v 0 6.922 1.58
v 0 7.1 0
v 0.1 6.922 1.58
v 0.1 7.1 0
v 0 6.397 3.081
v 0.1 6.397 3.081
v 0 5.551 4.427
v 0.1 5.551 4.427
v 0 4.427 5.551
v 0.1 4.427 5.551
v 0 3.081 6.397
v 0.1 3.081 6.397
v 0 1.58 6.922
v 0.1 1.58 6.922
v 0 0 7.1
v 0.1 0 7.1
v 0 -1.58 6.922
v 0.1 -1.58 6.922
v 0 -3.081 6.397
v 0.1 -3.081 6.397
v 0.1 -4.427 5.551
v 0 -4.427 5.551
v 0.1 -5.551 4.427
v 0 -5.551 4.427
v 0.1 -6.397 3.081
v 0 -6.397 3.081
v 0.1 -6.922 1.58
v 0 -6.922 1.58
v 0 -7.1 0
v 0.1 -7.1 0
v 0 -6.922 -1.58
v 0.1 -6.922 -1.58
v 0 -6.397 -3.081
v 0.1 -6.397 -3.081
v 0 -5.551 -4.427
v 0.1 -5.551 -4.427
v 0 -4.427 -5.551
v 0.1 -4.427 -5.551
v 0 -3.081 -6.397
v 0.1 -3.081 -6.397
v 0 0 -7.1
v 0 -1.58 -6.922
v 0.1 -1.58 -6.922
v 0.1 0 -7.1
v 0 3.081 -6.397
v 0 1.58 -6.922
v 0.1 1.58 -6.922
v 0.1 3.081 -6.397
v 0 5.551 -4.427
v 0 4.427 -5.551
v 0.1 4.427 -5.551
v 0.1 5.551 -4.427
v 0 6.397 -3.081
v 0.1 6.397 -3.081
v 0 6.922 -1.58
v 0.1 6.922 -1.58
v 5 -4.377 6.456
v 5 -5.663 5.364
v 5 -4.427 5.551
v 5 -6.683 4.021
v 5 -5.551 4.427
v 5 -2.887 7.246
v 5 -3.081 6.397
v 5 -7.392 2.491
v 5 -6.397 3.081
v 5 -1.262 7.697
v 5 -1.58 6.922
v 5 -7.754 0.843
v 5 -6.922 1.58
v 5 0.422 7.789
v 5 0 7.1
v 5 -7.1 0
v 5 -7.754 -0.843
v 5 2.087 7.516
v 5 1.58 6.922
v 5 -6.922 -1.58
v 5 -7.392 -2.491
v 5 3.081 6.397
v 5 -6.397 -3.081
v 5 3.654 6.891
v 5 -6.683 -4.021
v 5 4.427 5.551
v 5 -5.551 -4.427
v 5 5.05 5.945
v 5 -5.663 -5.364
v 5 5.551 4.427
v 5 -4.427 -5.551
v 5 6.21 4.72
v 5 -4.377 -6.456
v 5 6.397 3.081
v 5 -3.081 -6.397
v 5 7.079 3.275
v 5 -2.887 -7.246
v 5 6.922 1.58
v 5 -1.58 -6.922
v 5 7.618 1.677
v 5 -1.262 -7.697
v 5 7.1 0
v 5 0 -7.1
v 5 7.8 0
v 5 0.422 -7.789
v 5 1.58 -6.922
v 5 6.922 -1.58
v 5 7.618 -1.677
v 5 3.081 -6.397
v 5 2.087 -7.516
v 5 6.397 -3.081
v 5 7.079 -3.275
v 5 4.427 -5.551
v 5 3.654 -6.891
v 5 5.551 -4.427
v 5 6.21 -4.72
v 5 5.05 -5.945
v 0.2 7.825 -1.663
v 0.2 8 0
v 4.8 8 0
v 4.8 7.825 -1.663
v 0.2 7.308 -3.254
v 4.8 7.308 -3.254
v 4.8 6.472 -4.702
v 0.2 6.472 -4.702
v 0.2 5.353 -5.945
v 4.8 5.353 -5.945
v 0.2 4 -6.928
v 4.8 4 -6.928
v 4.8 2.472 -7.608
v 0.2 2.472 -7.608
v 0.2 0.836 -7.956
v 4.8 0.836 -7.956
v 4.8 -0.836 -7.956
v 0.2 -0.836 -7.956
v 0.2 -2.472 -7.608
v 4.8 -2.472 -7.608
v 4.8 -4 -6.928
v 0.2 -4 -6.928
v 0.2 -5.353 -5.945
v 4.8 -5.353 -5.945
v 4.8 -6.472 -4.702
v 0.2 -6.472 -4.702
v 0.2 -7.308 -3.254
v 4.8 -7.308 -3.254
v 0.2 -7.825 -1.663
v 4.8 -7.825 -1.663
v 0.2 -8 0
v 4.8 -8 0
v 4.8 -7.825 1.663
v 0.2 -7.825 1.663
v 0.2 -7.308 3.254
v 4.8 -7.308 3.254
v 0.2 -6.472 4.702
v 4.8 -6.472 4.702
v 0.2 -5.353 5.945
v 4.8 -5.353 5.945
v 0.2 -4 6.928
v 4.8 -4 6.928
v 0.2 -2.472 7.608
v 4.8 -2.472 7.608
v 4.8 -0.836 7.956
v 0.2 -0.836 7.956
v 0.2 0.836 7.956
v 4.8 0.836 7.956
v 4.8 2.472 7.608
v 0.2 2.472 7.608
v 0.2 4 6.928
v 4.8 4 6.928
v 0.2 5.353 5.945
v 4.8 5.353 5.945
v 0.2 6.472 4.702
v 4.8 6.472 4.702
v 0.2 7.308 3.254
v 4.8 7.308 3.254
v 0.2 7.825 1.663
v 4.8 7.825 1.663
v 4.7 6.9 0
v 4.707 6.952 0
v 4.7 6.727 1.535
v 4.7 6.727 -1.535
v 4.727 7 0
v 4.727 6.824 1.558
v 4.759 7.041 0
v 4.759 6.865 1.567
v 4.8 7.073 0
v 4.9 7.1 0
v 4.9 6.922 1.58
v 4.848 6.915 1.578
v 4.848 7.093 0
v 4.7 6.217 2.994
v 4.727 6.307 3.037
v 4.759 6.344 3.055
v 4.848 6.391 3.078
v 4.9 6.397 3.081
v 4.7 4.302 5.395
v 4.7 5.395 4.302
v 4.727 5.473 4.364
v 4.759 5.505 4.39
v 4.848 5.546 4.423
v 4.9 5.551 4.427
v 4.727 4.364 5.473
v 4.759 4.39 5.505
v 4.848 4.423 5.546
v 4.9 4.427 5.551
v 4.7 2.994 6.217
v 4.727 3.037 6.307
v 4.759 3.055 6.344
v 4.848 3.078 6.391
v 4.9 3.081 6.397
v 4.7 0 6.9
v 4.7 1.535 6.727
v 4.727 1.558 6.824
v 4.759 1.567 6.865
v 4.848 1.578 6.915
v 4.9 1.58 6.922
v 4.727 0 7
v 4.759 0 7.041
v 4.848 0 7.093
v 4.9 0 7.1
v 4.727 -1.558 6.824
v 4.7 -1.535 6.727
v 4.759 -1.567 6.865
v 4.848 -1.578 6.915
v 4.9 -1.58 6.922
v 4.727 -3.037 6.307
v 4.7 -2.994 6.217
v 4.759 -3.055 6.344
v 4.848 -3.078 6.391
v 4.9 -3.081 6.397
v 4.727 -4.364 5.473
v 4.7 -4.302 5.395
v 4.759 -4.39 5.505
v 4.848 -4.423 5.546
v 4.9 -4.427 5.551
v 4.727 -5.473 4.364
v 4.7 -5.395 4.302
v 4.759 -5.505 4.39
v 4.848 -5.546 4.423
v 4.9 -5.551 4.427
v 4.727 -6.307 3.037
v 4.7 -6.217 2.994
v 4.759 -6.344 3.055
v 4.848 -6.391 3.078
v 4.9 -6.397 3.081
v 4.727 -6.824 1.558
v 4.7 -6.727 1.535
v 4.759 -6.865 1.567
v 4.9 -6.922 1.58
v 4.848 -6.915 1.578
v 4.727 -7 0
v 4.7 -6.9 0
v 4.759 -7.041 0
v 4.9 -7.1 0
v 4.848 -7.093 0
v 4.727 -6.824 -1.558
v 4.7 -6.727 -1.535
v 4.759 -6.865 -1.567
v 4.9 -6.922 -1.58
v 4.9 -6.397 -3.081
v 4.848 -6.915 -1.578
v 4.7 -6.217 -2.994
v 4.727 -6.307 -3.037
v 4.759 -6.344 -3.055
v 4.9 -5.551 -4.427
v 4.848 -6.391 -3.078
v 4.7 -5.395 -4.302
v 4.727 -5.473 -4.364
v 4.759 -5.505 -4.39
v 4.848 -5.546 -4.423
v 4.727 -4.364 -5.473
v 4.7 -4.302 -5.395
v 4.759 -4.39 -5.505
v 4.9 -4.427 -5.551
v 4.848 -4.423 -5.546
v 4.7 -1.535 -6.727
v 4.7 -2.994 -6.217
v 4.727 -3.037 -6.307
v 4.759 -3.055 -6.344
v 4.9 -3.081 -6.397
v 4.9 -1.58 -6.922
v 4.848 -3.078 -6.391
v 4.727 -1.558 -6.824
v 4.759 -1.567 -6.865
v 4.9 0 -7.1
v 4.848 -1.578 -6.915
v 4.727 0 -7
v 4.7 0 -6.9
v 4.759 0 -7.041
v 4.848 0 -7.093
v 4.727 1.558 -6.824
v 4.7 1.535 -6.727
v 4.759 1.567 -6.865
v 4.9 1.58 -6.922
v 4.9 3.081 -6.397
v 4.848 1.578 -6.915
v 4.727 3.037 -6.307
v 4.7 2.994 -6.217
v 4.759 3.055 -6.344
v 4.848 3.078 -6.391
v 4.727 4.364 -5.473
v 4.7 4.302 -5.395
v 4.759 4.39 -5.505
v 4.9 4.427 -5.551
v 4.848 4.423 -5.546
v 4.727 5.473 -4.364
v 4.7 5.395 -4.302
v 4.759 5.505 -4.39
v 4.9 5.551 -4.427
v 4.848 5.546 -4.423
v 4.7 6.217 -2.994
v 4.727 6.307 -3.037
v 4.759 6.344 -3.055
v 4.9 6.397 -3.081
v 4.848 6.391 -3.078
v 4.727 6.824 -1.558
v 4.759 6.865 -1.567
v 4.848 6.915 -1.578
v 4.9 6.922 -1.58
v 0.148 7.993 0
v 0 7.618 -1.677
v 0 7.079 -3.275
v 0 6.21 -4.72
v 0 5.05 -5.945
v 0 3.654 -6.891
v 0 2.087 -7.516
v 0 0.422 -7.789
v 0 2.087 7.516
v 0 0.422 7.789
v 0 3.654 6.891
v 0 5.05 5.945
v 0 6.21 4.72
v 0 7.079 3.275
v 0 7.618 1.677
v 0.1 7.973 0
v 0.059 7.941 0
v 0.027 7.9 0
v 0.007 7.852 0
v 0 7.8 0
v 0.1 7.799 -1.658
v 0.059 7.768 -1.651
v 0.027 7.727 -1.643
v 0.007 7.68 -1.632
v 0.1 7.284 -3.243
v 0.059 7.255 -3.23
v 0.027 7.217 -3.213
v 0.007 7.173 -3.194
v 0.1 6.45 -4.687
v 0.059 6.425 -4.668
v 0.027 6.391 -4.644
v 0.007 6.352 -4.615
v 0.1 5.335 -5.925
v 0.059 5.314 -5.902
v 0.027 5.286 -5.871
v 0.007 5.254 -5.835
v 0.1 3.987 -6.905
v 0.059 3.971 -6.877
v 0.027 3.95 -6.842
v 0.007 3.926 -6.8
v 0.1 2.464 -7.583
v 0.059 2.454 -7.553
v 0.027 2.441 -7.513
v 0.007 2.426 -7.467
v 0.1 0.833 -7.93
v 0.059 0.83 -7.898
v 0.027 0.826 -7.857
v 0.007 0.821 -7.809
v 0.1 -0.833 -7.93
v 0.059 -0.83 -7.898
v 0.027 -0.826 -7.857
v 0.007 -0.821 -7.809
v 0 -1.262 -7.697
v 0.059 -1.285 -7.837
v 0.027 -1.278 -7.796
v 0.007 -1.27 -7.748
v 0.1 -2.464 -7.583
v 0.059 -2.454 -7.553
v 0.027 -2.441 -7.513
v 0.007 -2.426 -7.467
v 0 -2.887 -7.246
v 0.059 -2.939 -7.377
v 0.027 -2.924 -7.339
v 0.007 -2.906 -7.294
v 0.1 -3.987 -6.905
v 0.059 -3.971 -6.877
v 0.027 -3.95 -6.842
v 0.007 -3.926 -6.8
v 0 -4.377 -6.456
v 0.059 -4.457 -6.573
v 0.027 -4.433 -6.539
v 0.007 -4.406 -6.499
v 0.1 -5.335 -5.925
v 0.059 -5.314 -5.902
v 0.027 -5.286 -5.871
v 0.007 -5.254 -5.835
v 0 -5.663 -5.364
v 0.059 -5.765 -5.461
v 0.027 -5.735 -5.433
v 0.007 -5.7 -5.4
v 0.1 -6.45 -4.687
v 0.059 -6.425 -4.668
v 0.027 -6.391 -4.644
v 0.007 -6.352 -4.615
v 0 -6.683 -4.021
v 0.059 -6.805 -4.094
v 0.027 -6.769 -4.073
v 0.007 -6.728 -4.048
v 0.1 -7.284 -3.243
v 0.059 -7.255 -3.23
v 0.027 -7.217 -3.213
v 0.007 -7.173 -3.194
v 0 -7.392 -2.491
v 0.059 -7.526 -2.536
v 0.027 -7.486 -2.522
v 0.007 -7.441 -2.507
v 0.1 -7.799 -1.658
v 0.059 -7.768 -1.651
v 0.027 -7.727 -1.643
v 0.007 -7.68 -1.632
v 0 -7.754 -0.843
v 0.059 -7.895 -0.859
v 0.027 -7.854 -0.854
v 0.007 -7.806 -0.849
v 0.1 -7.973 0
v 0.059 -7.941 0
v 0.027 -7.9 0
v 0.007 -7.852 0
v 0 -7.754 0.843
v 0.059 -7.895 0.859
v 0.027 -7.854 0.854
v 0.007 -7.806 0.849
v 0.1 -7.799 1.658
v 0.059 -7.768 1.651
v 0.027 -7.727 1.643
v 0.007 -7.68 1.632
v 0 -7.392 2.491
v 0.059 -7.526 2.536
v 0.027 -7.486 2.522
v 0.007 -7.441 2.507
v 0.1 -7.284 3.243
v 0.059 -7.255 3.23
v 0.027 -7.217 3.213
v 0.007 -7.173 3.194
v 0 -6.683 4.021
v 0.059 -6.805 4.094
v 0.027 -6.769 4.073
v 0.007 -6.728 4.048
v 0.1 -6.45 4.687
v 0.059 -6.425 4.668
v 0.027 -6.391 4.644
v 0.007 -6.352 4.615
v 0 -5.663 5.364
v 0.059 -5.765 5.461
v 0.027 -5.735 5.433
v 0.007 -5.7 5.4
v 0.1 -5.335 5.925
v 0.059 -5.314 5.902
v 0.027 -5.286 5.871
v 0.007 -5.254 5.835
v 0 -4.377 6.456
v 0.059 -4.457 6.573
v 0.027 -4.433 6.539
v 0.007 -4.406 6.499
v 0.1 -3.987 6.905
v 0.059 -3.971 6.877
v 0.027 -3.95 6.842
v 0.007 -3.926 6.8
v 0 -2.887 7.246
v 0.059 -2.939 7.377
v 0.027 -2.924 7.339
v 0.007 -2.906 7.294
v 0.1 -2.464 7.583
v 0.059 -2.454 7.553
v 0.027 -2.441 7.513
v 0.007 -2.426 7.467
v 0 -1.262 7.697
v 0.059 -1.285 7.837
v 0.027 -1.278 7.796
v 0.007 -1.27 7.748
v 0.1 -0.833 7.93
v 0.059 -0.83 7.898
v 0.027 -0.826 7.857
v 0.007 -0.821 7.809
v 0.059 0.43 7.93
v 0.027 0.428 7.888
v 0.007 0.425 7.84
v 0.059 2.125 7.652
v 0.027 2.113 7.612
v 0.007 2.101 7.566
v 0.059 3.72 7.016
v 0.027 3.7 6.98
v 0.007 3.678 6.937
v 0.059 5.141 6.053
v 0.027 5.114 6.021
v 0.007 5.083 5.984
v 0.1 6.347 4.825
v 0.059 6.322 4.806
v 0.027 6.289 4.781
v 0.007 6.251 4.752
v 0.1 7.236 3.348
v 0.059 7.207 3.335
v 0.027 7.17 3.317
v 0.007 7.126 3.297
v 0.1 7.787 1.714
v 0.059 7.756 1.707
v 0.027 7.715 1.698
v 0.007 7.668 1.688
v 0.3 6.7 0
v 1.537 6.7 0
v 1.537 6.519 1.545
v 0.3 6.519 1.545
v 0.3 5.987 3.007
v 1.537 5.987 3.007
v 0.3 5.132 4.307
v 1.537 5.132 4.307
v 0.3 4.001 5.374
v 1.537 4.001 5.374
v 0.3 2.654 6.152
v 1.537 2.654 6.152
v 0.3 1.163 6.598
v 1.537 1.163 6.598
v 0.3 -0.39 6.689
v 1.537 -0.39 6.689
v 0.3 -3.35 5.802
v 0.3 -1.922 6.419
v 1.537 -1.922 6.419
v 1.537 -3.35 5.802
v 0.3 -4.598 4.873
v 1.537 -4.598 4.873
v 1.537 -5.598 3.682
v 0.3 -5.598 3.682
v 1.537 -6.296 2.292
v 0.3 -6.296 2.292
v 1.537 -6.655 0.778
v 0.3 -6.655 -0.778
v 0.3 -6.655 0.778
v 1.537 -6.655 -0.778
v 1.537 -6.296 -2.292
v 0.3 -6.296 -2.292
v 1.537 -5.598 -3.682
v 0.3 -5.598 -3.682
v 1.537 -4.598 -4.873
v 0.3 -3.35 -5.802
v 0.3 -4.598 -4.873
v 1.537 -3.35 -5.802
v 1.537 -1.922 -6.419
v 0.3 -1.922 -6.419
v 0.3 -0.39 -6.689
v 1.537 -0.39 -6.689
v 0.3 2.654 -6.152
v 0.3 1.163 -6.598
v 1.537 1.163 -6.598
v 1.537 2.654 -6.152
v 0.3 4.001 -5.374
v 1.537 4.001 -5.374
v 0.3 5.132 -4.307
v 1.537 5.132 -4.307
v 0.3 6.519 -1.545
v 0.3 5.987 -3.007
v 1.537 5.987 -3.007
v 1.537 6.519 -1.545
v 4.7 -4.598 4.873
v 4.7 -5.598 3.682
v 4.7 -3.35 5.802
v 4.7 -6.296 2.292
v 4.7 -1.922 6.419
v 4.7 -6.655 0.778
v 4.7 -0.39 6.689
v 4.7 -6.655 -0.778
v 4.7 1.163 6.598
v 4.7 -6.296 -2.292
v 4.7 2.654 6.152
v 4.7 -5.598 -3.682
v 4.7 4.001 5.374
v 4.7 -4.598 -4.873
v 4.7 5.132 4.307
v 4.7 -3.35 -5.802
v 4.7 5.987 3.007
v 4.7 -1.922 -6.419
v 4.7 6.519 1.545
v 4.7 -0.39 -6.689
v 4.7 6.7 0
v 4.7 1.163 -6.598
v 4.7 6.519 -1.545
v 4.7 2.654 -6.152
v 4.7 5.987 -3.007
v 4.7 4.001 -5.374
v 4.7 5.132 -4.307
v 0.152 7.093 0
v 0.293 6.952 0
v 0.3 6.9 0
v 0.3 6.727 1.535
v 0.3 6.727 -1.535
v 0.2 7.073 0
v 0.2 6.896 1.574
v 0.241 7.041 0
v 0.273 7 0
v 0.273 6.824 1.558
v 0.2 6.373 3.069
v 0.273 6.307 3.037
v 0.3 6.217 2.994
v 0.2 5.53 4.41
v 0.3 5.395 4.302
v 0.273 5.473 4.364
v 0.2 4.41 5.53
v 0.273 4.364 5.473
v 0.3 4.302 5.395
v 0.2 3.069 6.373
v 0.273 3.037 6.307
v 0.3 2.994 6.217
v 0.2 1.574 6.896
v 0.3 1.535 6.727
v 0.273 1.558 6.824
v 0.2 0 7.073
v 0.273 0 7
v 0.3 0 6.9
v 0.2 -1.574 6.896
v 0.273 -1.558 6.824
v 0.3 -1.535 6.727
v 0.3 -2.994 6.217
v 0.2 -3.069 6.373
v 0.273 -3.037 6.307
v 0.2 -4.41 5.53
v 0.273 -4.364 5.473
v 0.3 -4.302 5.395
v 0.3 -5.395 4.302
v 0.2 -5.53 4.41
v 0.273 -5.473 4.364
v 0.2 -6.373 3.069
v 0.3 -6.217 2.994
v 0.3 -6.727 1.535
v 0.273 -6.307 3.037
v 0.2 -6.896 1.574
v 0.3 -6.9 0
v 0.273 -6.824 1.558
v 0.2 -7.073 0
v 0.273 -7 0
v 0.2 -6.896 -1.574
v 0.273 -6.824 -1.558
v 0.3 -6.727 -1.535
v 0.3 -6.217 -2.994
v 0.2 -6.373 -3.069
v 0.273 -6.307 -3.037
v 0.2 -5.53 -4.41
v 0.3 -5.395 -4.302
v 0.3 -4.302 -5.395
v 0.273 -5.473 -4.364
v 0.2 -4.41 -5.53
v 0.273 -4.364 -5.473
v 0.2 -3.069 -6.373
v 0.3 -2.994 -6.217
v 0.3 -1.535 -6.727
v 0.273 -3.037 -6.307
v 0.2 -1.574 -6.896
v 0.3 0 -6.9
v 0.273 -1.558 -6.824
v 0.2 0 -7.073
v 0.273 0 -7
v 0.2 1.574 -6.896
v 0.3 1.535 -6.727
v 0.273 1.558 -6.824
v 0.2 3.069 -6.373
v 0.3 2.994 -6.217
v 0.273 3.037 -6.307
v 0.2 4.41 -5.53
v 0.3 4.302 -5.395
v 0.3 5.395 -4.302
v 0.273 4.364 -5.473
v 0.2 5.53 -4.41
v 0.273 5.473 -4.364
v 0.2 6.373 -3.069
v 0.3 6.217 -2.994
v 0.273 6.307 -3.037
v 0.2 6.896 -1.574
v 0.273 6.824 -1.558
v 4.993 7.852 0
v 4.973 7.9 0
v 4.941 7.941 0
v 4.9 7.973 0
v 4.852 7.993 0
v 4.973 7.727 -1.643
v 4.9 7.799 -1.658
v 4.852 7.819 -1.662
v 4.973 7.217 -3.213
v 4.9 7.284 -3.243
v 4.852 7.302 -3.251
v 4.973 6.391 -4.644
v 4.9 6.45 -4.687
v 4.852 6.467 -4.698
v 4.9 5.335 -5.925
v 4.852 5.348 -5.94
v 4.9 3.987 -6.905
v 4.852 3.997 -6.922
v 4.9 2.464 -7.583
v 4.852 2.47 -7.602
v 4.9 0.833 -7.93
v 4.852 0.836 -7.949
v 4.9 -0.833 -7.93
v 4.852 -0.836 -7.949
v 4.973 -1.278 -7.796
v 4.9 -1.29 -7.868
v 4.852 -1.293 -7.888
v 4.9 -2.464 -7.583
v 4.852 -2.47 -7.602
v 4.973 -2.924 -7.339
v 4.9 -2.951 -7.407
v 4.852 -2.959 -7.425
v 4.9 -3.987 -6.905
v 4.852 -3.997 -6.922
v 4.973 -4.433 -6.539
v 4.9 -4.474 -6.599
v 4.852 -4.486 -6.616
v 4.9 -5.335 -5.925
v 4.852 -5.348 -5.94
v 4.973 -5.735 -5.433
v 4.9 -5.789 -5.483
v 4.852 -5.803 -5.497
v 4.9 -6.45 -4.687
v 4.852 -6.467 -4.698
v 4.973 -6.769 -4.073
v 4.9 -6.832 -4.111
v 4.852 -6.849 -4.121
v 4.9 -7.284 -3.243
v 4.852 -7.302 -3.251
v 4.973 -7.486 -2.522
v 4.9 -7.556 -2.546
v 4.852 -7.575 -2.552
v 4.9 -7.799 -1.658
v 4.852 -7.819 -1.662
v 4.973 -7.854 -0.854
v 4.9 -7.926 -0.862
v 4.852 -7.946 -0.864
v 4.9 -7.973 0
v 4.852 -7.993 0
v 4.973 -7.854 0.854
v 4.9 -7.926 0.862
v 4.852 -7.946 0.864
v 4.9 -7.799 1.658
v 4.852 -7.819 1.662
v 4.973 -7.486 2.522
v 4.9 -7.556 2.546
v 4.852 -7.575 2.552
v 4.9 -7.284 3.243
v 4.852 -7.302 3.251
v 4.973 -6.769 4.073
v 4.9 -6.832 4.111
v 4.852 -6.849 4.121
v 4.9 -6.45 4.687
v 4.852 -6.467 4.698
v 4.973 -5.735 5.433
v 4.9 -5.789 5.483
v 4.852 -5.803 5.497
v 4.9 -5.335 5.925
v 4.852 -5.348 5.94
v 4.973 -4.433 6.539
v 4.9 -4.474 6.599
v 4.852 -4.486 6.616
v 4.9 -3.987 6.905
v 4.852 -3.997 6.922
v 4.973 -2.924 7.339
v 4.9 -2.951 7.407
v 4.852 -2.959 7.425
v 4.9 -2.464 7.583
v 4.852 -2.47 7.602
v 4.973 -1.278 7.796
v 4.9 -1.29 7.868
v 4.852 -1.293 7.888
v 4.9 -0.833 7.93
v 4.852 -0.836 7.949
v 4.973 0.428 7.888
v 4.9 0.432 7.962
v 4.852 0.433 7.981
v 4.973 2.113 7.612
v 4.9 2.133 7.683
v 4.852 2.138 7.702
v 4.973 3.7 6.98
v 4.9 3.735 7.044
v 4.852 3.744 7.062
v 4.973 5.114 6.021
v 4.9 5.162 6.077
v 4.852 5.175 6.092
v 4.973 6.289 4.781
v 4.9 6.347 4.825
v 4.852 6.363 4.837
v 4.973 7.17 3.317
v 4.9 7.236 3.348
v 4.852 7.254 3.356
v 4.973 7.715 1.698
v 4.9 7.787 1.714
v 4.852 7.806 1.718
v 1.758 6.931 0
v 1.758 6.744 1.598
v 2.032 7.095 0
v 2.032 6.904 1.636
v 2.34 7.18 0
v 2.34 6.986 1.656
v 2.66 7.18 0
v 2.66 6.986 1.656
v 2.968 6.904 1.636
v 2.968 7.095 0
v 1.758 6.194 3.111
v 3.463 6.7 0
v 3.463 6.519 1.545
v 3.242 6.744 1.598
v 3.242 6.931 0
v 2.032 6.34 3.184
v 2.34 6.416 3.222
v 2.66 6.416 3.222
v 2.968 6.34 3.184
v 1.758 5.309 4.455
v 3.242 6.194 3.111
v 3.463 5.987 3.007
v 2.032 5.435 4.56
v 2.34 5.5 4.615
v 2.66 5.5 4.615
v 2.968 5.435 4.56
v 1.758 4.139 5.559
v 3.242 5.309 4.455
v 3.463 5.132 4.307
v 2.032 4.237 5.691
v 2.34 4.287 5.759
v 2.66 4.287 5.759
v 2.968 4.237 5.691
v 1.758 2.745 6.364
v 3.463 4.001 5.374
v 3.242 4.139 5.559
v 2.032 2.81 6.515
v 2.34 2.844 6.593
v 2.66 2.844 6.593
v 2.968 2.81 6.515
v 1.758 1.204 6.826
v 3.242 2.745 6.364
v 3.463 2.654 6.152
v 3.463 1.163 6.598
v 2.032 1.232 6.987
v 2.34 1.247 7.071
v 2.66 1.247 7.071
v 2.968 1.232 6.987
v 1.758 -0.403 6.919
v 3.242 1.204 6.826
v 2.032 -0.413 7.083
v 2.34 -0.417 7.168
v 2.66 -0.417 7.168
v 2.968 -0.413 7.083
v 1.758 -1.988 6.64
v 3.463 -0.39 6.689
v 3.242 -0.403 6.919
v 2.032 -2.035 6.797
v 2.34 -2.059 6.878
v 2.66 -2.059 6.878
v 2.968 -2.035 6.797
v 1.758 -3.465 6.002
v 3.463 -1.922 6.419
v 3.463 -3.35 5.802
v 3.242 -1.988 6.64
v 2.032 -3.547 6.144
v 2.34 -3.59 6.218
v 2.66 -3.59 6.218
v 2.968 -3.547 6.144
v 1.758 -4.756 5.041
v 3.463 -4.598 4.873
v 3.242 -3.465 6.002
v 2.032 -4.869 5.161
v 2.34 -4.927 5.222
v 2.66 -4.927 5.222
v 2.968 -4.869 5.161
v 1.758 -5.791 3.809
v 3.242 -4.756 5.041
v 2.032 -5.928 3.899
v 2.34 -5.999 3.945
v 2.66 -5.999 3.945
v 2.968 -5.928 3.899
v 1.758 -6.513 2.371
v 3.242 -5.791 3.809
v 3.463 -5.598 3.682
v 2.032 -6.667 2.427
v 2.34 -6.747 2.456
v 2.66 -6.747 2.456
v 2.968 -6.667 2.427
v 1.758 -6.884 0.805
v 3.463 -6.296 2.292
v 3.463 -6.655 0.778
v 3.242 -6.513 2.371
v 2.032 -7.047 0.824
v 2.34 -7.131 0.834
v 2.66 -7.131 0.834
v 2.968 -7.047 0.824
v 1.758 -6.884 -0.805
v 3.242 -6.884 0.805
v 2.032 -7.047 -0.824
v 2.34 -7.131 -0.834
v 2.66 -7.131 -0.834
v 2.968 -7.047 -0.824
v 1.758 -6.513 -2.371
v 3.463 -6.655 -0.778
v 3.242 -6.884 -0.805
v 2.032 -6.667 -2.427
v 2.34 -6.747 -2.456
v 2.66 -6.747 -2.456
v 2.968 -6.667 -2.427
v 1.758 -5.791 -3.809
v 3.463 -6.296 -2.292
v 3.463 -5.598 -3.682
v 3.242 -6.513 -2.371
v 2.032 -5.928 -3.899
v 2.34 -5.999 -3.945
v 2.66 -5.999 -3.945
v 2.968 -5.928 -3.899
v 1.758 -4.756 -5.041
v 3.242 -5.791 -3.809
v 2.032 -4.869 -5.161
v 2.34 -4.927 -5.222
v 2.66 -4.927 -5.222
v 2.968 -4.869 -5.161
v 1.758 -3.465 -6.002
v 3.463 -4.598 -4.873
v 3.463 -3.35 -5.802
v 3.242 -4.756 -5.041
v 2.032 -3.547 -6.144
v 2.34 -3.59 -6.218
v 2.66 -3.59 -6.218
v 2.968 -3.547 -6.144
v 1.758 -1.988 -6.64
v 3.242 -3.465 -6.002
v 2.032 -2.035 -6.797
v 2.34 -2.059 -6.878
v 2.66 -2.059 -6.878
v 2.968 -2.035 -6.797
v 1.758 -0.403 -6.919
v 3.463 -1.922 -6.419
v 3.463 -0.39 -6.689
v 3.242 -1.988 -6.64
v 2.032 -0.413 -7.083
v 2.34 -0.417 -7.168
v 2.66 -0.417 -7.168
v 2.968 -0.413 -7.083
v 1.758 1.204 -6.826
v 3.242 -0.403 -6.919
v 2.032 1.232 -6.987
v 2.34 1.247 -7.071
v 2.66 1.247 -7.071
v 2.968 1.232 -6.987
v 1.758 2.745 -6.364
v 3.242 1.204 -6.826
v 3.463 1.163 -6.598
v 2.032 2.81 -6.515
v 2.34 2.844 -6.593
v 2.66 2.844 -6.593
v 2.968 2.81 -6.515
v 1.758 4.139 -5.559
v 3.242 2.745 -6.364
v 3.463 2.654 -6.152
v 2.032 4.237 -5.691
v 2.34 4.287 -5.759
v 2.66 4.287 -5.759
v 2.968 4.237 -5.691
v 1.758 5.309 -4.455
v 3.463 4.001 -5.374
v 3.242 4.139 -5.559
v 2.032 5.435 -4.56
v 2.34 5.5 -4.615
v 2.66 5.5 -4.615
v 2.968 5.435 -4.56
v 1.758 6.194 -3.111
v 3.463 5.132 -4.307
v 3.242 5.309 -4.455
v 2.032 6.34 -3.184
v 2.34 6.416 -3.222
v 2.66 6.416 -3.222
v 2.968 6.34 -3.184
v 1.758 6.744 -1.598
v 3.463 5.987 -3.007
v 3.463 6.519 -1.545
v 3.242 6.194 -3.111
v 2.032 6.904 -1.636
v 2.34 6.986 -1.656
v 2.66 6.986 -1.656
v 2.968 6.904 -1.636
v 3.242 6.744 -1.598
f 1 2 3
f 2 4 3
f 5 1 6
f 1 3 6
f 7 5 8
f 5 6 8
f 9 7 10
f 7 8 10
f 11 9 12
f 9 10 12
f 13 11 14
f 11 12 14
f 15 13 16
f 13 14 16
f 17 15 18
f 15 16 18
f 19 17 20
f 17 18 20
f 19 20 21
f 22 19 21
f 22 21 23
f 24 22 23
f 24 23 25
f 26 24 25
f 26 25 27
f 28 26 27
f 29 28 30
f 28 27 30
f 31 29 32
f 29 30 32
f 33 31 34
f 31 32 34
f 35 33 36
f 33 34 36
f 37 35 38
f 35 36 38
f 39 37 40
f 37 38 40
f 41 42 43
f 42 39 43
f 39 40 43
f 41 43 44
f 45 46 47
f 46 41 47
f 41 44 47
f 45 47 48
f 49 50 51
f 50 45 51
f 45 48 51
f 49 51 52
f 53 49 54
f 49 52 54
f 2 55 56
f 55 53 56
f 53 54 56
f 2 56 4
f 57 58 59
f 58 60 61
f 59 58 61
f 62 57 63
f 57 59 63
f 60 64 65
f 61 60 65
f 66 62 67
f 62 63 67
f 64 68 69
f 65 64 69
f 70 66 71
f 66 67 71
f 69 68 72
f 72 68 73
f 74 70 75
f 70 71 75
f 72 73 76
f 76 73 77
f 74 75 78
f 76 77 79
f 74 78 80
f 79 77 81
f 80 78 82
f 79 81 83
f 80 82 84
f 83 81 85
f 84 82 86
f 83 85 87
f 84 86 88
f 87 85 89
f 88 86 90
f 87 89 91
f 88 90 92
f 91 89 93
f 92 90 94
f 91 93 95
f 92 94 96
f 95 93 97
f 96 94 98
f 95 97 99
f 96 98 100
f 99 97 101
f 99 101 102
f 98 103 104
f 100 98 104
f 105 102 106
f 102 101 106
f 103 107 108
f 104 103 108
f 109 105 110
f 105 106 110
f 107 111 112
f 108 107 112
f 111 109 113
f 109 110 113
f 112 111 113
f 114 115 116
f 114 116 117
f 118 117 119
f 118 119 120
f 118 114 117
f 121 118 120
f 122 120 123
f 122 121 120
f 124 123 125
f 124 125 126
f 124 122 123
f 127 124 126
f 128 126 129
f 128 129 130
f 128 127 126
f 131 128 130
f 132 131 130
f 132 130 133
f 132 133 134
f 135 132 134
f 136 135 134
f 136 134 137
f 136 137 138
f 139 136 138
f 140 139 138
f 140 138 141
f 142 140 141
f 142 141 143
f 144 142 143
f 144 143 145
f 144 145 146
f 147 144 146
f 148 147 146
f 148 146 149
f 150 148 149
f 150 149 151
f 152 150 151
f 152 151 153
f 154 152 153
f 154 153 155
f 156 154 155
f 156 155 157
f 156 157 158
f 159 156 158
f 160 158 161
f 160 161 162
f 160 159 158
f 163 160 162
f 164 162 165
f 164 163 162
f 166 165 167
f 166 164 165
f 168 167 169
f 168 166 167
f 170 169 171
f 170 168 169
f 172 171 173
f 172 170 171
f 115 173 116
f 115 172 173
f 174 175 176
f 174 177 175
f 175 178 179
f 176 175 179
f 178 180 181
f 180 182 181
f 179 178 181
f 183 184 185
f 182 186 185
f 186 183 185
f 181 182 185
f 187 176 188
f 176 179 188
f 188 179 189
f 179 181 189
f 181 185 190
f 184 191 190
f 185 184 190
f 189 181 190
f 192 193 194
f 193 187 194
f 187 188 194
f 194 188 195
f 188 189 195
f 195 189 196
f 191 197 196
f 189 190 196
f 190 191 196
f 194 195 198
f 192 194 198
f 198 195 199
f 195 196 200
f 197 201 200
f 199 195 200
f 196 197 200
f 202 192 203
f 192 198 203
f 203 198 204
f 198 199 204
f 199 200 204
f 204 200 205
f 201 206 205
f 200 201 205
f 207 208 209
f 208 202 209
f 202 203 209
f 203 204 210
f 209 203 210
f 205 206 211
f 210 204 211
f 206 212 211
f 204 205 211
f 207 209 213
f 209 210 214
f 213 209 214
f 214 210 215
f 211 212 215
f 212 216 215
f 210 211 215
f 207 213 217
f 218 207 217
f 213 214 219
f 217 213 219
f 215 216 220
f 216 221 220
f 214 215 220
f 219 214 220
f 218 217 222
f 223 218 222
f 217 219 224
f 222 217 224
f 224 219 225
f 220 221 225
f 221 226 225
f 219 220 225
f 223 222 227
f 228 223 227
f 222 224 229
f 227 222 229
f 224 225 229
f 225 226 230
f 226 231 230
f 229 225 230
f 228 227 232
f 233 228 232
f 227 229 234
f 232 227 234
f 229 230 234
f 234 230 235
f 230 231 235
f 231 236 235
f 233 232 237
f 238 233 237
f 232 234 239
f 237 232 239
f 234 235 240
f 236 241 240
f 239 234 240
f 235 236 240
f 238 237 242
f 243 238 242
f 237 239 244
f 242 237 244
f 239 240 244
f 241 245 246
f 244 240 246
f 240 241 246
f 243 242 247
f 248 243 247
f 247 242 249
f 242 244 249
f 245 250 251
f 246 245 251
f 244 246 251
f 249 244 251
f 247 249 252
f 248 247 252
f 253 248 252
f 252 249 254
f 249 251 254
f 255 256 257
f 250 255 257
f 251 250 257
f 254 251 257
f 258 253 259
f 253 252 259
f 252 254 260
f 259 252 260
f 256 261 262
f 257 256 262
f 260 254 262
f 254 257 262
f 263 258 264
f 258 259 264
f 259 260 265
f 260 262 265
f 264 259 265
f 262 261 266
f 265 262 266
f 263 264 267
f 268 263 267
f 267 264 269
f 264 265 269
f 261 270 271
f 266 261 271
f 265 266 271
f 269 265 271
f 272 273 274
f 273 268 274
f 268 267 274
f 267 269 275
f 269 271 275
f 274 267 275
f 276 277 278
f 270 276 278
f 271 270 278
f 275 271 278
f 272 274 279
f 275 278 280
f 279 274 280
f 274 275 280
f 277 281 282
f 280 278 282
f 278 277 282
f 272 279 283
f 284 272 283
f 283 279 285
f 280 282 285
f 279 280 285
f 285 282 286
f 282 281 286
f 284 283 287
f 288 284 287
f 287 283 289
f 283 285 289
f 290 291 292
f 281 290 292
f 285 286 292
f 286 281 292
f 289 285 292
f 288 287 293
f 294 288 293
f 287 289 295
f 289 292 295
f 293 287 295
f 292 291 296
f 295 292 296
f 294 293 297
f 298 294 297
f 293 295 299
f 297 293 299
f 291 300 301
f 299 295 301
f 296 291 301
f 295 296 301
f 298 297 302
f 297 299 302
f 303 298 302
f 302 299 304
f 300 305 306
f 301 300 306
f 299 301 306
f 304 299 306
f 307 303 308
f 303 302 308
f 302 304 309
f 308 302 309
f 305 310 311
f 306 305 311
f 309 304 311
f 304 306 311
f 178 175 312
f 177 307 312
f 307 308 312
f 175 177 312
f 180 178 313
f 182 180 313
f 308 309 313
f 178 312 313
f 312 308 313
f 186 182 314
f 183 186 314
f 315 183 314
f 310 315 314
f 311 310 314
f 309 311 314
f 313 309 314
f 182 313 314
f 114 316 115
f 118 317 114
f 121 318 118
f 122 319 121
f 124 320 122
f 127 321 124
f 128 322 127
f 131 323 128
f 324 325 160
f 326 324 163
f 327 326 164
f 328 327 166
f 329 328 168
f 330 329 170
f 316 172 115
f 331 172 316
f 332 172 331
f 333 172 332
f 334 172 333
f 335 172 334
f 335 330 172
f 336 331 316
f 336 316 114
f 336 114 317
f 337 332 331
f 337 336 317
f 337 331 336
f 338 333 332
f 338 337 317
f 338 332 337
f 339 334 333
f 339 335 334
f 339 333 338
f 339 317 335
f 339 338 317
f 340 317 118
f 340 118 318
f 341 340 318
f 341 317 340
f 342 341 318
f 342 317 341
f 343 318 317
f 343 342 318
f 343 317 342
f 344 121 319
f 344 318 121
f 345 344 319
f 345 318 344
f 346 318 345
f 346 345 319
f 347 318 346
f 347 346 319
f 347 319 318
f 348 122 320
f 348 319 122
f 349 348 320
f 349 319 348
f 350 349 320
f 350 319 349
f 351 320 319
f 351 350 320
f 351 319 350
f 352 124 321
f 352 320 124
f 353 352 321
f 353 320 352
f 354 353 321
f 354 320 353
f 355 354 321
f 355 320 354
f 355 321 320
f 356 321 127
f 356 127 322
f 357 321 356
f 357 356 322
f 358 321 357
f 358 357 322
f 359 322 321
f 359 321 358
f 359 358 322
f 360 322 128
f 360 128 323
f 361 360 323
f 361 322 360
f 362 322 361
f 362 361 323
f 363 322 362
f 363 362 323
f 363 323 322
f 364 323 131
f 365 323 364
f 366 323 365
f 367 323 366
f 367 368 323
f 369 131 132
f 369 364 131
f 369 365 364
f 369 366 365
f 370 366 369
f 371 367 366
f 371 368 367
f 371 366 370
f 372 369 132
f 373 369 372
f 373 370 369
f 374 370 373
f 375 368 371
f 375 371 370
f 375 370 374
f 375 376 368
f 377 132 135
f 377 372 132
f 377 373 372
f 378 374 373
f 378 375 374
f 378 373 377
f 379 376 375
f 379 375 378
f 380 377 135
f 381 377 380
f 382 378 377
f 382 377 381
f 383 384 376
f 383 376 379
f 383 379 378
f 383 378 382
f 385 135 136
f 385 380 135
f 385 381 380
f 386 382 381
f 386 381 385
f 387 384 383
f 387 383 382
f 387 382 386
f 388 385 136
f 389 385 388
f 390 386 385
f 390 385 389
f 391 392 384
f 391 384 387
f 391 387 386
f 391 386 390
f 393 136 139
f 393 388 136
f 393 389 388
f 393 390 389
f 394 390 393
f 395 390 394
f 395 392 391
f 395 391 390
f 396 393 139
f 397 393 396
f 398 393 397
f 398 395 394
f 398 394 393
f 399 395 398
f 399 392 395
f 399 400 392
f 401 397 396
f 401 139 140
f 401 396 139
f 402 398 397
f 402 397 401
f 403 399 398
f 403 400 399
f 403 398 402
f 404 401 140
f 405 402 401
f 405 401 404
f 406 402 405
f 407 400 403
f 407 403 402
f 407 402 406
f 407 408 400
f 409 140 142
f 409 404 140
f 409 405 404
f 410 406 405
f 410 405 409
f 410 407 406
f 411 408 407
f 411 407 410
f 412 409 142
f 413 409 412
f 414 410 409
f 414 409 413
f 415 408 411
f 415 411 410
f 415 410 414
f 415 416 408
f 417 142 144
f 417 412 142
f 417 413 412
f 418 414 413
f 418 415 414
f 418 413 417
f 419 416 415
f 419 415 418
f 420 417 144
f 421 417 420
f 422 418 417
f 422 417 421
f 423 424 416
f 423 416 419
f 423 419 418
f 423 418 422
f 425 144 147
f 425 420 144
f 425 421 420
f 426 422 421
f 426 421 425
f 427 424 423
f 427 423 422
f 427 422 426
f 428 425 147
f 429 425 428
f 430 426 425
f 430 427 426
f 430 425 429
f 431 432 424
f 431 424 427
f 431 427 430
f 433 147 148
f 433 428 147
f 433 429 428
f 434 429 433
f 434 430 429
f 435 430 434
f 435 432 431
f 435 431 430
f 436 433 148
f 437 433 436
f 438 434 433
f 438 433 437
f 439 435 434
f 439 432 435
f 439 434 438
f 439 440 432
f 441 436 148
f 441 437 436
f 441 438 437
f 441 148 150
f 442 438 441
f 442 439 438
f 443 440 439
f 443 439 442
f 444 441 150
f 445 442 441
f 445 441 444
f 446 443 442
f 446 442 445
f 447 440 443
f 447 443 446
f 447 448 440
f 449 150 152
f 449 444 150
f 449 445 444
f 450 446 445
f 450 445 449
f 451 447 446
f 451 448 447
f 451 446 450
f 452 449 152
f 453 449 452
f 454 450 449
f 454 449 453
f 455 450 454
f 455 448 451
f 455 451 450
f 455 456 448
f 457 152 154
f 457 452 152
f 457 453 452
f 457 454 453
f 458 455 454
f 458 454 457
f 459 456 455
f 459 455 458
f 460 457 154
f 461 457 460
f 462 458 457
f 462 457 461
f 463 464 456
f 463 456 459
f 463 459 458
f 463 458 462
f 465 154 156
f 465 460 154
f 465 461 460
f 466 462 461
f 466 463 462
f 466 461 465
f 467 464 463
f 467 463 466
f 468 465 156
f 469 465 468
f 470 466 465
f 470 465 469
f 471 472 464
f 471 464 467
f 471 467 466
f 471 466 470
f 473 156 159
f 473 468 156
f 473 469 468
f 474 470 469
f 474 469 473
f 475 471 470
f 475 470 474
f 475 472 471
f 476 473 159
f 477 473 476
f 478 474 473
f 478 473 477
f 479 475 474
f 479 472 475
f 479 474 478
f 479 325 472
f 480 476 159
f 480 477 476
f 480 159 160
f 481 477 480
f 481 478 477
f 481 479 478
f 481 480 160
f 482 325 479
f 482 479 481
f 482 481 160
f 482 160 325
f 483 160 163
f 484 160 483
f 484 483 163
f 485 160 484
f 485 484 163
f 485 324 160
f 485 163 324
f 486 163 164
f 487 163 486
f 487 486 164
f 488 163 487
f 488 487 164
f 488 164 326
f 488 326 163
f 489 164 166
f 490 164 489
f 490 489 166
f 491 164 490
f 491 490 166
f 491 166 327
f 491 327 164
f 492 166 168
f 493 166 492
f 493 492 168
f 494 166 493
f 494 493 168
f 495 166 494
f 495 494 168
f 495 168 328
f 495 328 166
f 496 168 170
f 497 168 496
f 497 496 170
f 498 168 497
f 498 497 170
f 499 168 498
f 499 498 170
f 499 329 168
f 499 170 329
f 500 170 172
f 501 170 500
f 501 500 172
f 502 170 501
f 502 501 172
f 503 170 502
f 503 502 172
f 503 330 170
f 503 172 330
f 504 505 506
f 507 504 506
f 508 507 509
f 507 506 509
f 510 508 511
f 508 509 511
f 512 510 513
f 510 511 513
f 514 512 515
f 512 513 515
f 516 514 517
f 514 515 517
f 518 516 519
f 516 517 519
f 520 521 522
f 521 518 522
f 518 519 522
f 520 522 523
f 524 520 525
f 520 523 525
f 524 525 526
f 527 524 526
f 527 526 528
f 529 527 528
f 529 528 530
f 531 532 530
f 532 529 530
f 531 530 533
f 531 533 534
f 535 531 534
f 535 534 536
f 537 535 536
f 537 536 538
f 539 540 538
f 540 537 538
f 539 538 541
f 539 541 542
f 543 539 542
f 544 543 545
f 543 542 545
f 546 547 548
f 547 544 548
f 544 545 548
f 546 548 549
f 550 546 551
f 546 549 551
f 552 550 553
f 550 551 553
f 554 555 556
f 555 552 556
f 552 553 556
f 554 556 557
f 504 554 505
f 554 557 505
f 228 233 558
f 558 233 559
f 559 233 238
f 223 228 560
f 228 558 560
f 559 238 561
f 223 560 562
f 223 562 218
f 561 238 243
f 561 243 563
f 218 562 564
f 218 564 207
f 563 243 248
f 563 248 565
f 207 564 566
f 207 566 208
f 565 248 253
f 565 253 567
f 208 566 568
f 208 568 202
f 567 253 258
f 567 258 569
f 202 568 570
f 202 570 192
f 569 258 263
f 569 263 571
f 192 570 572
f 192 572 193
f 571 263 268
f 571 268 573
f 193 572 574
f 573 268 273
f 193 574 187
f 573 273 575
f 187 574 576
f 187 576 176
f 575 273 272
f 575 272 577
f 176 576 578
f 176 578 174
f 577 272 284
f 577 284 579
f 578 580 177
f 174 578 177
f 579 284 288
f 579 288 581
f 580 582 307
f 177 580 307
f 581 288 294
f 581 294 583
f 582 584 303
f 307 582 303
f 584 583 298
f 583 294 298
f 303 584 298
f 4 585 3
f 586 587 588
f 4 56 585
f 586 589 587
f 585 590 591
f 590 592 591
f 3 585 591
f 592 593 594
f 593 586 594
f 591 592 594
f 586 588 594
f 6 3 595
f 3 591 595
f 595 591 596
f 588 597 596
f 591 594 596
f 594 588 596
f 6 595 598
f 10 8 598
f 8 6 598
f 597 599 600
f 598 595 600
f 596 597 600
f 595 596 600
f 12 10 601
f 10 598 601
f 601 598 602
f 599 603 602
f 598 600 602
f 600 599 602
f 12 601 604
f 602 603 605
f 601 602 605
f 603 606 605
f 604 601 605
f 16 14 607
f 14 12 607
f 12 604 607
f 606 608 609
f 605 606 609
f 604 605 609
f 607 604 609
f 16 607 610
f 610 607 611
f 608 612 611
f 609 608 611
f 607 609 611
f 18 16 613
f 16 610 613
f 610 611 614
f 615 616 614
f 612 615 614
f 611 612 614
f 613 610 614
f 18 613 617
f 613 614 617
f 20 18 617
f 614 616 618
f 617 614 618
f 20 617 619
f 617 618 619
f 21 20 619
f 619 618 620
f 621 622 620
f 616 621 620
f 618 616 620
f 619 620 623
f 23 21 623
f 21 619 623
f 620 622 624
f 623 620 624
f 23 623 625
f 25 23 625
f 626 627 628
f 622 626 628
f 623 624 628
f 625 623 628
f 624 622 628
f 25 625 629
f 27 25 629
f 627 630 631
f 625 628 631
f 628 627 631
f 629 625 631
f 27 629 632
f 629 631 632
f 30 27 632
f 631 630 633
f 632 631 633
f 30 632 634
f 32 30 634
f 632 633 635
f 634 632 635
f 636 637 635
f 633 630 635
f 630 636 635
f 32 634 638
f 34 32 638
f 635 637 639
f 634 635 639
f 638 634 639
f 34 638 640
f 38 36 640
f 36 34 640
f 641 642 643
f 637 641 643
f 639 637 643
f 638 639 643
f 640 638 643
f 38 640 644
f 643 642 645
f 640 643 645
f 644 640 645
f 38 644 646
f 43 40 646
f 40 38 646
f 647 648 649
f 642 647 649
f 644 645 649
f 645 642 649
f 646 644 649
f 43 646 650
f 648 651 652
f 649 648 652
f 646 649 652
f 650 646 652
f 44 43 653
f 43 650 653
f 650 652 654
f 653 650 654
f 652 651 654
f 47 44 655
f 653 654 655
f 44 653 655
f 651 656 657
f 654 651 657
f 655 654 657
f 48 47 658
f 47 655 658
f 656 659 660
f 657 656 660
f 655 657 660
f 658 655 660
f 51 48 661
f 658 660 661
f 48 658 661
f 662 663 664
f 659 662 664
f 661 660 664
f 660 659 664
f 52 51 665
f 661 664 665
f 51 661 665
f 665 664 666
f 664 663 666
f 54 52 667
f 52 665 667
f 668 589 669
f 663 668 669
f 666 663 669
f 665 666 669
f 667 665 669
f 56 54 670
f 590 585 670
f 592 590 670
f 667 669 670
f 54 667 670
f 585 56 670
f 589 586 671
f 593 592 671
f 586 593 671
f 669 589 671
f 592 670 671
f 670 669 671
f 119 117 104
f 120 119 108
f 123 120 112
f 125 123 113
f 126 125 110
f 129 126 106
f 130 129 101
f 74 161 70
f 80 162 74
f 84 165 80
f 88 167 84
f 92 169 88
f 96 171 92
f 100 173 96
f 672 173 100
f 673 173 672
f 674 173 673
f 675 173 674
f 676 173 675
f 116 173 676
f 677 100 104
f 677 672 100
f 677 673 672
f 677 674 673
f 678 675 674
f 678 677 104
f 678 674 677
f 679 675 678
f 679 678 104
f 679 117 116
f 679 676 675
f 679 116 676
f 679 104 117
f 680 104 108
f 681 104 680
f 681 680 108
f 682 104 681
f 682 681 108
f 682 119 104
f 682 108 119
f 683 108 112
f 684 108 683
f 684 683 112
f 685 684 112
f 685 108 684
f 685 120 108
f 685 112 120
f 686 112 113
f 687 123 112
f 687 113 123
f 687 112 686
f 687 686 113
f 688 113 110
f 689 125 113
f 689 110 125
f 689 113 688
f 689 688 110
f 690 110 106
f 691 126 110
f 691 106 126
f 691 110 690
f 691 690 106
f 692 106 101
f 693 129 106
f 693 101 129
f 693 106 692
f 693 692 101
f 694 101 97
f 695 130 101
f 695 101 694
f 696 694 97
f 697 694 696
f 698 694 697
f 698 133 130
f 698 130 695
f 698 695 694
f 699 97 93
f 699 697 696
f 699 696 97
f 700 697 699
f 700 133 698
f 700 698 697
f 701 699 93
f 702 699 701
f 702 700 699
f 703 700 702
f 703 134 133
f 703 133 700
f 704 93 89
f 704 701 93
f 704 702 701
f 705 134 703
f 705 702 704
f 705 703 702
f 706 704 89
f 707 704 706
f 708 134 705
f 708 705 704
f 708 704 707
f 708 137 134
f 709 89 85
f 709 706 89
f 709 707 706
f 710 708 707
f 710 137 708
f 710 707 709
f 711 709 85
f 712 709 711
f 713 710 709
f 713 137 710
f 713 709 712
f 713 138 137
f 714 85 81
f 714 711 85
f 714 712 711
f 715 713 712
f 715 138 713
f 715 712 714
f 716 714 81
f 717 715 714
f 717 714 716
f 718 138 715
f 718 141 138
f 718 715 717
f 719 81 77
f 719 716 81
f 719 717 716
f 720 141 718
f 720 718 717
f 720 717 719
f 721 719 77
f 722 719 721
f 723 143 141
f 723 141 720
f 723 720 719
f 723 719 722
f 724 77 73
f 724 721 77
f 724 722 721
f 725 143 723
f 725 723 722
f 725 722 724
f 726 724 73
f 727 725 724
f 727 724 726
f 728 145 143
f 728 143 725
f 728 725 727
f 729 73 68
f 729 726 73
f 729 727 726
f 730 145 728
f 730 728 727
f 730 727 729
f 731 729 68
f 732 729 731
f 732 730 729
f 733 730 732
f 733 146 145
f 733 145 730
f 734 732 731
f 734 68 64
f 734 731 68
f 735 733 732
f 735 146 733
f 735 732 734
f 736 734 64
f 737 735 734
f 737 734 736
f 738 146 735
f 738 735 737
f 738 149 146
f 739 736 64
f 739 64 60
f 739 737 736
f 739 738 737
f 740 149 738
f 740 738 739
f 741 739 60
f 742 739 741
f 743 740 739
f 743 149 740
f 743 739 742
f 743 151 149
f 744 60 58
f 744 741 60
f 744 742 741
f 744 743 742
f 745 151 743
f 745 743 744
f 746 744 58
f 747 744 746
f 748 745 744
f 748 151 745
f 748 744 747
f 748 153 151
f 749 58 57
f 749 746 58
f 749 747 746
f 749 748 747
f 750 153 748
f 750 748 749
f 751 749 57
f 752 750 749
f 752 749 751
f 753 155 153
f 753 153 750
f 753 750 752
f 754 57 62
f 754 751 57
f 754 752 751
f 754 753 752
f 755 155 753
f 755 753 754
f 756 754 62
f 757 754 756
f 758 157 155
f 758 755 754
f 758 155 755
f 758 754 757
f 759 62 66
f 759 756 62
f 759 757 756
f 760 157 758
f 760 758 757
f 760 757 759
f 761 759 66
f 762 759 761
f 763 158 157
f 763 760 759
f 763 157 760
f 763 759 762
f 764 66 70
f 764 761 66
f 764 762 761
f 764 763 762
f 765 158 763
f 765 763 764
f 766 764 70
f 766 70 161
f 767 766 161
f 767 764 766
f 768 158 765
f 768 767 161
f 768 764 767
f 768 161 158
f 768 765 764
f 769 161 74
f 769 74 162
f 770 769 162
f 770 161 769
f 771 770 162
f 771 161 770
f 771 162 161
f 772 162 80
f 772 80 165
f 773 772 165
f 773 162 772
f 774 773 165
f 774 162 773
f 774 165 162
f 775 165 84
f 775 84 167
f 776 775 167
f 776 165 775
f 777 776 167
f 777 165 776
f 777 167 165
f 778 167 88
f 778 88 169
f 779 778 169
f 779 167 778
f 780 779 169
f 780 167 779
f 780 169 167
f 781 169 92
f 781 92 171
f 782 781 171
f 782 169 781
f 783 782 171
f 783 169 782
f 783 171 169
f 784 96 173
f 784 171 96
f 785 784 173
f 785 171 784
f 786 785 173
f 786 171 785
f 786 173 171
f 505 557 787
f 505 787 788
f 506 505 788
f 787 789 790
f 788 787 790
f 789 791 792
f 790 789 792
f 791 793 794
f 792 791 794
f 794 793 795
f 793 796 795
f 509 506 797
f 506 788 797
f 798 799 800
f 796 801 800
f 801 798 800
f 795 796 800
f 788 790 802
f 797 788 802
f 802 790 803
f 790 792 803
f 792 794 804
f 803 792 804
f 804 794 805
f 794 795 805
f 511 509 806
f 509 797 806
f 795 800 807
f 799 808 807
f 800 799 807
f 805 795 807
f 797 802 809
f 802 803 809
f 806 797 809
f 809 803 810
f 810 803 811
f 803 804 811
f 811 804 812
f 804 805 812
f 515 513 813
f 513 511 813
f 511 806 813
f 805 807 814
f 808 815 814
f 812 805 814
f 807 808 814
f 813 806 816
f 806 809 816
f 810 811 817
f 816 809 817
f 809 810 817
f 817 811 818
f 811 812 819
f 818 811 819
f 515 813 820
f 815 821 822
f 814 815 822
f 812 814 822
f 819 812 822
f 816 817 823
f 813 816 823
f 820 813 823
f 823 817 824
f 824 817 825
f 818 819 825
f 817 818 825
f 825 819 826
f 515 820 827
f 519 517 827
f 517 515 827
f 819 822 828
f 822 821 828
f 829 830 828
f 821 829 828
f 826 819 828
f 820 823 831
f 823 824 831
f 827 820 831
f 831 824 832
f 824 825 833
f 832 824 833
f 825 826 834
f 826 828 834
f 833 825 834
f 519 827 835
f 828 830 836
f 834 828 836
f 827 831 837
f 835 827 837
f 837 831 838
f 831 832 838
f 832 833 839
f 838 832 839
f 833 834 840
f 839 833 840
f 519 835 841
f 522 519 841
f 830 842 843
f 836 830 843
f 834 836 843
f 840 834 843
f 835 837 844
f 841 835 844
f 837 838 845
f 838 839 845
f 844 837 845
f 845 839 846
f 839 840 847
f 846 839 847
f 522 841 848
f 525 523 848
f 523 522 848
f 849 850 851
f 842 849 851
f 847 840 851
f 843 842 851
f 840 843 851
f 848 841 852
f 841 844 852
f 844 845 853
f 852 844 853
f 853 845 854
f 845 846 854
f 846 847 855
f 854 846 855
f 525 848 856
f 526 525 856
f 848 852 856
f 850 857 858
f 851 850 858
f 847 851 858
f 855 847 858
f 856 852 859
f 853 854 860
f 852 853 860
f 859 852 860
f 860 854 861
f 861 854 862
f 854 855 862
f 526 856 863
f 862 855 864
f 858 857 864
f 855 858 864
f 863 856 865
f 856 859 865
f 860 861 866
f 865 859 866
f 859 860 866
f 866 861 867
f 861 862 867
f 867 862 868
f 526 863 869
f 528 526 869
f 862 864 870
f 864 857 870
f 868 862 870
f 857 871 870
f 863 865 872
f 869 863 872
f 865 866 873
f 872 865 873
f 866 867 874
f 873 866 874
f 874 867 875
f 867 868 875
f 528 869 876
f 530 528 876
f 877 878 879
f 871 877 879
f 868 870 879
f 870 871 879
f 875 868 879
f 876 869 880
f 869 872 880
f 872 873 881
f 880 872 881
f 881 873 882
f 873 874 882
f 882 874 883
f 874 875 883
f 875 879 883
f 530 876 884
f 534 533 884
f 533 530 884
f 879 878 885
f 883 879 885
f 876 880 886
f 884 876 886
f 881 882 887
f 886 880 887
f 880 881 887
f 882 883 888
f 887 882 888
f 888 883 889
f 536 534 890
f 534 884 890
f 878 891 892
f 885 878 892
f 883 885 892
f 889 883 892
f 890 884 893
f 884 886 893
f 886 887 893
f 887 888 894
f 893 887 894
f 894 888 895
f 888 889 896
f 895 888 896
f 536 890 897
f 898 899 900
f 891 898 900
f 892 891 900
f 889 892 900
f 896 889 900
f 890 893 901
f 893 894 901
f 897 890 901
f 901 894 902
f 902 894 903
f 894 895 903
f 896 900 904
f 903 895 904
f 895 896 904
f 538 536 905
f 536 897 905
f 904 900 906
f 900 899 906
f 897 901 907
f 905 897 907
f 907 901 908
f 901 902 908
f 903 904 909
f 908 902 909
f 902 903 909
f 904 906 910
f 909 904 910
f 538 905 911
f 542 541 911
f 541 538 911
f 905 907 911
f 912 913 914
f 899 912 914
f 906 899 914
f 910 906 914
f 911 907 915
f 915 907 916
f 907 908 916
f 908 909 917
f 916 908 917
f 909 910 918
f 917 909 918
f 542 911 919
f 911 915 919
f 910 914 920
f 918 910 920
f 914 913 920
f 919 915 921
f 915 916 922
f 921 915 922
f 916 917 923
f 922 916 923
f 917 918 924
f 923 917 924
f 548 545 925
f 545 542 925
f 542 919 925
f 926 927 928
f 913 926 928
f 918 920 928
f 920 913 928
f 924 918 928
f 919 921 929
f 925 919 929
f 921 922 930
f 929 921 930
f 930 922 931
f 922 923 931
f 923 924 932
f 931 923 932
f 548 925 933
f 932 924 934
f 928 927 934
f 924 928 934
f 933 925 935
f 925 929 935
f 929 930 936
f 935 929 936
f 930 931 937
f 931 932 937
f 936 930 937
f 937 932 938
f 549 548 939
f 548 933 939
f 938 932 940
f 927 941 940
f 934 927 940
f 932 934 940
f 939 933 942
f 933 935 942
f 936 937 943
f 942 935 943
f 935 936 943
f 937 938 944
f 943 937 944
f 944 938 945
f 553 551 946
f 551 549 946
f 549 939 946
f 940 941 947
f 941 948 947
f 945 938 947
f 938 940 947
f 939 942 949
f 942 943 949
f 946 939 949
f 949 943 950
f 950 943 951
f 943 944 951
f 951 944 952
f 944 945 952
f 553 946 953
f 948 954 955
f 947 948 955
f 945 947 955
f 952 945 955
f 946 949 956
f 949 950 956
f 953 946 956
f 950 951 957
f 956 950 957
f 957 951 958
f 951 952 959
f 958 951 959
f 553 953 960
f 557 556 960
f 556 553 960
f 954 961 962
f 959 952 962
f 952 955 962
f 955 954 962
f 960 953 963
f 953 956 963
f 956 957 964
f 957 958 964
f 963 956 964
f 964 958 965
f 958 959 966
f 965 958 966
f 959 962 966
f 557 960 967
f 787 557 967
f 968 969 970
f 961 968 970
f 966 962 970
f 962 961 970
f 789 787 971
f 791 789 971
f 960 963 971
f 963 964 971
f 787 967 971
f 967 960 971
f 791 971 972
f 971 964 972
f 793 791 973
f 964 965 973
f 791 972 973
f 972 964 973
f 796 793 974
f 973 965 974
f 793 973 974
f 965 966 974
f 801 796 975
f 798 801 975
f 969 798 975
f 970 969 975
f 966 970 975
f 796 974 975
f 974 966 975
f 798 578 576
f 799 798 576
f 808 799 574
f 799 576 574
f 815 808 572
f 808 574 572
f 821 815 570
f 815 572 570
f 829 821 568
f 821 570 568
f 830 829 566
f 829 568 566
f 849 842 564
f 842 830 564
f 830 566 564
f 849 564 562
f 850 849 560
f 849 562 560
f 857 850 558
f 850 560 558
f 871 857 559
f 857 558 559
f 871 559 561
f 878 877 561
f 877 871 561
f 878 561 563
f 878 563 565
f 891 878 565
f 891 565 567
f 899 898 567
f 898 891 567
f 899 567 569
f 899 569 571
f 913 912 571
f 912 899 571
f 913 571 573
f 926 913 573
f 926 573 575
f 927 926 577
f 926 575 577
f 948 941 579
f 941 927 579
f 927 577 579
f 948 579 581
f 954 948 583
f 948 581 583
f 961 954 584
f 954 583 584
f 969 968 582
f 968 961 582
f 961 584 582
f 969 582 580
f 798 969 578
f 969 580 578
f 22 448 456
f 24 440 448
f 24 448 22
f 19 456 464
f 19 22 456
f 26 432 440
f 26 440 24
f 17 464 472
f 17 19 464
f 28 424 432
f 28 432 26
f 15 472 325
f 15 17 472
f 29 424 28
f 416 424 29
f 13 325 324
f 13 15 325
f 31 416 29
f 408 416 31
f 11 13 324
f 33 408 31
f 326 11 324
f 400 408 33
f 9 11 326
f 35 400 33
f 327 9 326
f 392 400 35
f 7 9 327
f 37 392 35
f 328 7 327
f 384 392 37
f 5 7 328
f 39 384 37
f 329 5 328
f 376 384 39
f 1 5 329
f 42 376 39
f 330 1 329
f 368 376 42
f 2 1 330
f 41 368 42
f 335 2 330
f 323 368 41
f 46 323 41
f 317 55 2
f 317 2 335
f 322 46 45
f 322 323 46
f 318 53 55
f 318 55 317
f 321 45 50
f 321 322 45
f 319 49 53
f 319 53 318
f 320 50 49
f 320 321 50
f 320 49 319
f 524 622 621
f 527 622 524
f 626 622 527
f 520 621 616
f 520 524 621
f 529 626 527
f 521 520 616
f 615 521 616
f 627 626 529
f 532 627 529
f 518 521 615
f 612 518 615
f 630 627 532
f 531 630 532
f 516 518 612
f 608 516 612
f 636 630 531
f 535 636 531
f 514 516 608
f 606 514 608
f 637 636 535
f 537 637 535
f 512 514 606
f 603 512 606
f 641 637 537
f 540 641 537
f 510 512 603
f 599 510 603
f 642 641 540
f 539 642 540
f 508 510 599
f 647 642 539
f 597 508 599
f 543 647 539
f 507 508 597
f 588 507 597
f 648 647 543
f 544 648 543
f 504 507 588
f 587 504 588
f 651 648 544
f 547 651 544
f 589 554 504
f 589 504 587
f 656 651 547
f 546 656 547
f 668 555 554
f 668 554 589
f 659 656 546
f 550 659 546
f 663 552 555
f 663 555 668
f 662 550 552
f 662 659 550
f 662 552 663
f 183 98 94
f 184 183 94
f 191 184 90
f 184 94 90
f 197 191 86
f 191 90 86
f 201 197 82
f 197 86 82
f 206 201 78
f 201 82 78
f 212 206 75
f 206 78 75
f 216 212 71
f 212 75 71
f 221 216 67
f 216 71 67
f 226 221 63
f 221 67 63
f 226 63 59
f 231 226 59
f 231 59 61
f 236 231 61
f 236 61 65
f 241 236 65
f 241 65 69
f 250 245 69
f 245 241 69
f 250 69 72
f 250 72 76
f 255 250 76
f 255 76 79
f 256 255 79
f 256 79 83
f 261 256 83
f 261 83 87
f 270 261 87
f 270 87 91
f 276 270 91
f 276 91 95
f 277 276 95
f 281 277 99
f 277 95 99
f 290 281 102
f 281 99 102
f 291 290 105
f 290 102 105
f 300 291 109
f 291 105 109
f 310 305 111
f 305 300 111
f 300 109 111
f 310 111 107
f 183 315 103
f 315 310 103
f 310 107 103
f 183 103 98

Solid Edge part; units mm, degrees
sketch "Sketch1" plane through (0, 0, 0) normal (0, 0, 1) x (1, 0, 0)
  line L0 (0, 7.8) -> (0, 7.1)
  line L1 (0, 7.1) -> (0.1, 7.1)
  arc A0 (0.1, 7.1) -> (0.3, 6.9) centre (0.1, 6.9) cw
  line L2 (0.3, 6.9) -> (0.3, 6.7)
  line L3 (0.3, 6.7) -> (1.537, 6.7)
  arc A1 (1.537, 6.7) -> (3.463, 6.7) centre (2.5, 6) cw
  line L4 (3.463, 6.7) -> (4.7, 6.7)
  line L5 (4.7, 6.7) -> (4.7, 6.9)
  arc A2 (4.7, 6.9) -> (4.9, 7.1) centre (4.9, 6.9) cw
  line L6 (4.9, 7.1) -> (5, 7.1)
  line L7 (5, 7.1) -> (5, 7.8)
  arc A3 (5, 7.8) -> (4.8, 8) centre (4.8, 7.8) ccw
  line L8 (4.8, 8) -> (0.2, 8)
  arc A4 (0.2, 8) -> (0, 7.8) centre (0.2, 7.8) ccw
revolve "RevolvedProtrusion1" add sketch "Sketch1" angle 360 about axis through (50, 0, 0) along (-1, 0, 0)
properties part number "SKF_628/8-2RS1_or"
